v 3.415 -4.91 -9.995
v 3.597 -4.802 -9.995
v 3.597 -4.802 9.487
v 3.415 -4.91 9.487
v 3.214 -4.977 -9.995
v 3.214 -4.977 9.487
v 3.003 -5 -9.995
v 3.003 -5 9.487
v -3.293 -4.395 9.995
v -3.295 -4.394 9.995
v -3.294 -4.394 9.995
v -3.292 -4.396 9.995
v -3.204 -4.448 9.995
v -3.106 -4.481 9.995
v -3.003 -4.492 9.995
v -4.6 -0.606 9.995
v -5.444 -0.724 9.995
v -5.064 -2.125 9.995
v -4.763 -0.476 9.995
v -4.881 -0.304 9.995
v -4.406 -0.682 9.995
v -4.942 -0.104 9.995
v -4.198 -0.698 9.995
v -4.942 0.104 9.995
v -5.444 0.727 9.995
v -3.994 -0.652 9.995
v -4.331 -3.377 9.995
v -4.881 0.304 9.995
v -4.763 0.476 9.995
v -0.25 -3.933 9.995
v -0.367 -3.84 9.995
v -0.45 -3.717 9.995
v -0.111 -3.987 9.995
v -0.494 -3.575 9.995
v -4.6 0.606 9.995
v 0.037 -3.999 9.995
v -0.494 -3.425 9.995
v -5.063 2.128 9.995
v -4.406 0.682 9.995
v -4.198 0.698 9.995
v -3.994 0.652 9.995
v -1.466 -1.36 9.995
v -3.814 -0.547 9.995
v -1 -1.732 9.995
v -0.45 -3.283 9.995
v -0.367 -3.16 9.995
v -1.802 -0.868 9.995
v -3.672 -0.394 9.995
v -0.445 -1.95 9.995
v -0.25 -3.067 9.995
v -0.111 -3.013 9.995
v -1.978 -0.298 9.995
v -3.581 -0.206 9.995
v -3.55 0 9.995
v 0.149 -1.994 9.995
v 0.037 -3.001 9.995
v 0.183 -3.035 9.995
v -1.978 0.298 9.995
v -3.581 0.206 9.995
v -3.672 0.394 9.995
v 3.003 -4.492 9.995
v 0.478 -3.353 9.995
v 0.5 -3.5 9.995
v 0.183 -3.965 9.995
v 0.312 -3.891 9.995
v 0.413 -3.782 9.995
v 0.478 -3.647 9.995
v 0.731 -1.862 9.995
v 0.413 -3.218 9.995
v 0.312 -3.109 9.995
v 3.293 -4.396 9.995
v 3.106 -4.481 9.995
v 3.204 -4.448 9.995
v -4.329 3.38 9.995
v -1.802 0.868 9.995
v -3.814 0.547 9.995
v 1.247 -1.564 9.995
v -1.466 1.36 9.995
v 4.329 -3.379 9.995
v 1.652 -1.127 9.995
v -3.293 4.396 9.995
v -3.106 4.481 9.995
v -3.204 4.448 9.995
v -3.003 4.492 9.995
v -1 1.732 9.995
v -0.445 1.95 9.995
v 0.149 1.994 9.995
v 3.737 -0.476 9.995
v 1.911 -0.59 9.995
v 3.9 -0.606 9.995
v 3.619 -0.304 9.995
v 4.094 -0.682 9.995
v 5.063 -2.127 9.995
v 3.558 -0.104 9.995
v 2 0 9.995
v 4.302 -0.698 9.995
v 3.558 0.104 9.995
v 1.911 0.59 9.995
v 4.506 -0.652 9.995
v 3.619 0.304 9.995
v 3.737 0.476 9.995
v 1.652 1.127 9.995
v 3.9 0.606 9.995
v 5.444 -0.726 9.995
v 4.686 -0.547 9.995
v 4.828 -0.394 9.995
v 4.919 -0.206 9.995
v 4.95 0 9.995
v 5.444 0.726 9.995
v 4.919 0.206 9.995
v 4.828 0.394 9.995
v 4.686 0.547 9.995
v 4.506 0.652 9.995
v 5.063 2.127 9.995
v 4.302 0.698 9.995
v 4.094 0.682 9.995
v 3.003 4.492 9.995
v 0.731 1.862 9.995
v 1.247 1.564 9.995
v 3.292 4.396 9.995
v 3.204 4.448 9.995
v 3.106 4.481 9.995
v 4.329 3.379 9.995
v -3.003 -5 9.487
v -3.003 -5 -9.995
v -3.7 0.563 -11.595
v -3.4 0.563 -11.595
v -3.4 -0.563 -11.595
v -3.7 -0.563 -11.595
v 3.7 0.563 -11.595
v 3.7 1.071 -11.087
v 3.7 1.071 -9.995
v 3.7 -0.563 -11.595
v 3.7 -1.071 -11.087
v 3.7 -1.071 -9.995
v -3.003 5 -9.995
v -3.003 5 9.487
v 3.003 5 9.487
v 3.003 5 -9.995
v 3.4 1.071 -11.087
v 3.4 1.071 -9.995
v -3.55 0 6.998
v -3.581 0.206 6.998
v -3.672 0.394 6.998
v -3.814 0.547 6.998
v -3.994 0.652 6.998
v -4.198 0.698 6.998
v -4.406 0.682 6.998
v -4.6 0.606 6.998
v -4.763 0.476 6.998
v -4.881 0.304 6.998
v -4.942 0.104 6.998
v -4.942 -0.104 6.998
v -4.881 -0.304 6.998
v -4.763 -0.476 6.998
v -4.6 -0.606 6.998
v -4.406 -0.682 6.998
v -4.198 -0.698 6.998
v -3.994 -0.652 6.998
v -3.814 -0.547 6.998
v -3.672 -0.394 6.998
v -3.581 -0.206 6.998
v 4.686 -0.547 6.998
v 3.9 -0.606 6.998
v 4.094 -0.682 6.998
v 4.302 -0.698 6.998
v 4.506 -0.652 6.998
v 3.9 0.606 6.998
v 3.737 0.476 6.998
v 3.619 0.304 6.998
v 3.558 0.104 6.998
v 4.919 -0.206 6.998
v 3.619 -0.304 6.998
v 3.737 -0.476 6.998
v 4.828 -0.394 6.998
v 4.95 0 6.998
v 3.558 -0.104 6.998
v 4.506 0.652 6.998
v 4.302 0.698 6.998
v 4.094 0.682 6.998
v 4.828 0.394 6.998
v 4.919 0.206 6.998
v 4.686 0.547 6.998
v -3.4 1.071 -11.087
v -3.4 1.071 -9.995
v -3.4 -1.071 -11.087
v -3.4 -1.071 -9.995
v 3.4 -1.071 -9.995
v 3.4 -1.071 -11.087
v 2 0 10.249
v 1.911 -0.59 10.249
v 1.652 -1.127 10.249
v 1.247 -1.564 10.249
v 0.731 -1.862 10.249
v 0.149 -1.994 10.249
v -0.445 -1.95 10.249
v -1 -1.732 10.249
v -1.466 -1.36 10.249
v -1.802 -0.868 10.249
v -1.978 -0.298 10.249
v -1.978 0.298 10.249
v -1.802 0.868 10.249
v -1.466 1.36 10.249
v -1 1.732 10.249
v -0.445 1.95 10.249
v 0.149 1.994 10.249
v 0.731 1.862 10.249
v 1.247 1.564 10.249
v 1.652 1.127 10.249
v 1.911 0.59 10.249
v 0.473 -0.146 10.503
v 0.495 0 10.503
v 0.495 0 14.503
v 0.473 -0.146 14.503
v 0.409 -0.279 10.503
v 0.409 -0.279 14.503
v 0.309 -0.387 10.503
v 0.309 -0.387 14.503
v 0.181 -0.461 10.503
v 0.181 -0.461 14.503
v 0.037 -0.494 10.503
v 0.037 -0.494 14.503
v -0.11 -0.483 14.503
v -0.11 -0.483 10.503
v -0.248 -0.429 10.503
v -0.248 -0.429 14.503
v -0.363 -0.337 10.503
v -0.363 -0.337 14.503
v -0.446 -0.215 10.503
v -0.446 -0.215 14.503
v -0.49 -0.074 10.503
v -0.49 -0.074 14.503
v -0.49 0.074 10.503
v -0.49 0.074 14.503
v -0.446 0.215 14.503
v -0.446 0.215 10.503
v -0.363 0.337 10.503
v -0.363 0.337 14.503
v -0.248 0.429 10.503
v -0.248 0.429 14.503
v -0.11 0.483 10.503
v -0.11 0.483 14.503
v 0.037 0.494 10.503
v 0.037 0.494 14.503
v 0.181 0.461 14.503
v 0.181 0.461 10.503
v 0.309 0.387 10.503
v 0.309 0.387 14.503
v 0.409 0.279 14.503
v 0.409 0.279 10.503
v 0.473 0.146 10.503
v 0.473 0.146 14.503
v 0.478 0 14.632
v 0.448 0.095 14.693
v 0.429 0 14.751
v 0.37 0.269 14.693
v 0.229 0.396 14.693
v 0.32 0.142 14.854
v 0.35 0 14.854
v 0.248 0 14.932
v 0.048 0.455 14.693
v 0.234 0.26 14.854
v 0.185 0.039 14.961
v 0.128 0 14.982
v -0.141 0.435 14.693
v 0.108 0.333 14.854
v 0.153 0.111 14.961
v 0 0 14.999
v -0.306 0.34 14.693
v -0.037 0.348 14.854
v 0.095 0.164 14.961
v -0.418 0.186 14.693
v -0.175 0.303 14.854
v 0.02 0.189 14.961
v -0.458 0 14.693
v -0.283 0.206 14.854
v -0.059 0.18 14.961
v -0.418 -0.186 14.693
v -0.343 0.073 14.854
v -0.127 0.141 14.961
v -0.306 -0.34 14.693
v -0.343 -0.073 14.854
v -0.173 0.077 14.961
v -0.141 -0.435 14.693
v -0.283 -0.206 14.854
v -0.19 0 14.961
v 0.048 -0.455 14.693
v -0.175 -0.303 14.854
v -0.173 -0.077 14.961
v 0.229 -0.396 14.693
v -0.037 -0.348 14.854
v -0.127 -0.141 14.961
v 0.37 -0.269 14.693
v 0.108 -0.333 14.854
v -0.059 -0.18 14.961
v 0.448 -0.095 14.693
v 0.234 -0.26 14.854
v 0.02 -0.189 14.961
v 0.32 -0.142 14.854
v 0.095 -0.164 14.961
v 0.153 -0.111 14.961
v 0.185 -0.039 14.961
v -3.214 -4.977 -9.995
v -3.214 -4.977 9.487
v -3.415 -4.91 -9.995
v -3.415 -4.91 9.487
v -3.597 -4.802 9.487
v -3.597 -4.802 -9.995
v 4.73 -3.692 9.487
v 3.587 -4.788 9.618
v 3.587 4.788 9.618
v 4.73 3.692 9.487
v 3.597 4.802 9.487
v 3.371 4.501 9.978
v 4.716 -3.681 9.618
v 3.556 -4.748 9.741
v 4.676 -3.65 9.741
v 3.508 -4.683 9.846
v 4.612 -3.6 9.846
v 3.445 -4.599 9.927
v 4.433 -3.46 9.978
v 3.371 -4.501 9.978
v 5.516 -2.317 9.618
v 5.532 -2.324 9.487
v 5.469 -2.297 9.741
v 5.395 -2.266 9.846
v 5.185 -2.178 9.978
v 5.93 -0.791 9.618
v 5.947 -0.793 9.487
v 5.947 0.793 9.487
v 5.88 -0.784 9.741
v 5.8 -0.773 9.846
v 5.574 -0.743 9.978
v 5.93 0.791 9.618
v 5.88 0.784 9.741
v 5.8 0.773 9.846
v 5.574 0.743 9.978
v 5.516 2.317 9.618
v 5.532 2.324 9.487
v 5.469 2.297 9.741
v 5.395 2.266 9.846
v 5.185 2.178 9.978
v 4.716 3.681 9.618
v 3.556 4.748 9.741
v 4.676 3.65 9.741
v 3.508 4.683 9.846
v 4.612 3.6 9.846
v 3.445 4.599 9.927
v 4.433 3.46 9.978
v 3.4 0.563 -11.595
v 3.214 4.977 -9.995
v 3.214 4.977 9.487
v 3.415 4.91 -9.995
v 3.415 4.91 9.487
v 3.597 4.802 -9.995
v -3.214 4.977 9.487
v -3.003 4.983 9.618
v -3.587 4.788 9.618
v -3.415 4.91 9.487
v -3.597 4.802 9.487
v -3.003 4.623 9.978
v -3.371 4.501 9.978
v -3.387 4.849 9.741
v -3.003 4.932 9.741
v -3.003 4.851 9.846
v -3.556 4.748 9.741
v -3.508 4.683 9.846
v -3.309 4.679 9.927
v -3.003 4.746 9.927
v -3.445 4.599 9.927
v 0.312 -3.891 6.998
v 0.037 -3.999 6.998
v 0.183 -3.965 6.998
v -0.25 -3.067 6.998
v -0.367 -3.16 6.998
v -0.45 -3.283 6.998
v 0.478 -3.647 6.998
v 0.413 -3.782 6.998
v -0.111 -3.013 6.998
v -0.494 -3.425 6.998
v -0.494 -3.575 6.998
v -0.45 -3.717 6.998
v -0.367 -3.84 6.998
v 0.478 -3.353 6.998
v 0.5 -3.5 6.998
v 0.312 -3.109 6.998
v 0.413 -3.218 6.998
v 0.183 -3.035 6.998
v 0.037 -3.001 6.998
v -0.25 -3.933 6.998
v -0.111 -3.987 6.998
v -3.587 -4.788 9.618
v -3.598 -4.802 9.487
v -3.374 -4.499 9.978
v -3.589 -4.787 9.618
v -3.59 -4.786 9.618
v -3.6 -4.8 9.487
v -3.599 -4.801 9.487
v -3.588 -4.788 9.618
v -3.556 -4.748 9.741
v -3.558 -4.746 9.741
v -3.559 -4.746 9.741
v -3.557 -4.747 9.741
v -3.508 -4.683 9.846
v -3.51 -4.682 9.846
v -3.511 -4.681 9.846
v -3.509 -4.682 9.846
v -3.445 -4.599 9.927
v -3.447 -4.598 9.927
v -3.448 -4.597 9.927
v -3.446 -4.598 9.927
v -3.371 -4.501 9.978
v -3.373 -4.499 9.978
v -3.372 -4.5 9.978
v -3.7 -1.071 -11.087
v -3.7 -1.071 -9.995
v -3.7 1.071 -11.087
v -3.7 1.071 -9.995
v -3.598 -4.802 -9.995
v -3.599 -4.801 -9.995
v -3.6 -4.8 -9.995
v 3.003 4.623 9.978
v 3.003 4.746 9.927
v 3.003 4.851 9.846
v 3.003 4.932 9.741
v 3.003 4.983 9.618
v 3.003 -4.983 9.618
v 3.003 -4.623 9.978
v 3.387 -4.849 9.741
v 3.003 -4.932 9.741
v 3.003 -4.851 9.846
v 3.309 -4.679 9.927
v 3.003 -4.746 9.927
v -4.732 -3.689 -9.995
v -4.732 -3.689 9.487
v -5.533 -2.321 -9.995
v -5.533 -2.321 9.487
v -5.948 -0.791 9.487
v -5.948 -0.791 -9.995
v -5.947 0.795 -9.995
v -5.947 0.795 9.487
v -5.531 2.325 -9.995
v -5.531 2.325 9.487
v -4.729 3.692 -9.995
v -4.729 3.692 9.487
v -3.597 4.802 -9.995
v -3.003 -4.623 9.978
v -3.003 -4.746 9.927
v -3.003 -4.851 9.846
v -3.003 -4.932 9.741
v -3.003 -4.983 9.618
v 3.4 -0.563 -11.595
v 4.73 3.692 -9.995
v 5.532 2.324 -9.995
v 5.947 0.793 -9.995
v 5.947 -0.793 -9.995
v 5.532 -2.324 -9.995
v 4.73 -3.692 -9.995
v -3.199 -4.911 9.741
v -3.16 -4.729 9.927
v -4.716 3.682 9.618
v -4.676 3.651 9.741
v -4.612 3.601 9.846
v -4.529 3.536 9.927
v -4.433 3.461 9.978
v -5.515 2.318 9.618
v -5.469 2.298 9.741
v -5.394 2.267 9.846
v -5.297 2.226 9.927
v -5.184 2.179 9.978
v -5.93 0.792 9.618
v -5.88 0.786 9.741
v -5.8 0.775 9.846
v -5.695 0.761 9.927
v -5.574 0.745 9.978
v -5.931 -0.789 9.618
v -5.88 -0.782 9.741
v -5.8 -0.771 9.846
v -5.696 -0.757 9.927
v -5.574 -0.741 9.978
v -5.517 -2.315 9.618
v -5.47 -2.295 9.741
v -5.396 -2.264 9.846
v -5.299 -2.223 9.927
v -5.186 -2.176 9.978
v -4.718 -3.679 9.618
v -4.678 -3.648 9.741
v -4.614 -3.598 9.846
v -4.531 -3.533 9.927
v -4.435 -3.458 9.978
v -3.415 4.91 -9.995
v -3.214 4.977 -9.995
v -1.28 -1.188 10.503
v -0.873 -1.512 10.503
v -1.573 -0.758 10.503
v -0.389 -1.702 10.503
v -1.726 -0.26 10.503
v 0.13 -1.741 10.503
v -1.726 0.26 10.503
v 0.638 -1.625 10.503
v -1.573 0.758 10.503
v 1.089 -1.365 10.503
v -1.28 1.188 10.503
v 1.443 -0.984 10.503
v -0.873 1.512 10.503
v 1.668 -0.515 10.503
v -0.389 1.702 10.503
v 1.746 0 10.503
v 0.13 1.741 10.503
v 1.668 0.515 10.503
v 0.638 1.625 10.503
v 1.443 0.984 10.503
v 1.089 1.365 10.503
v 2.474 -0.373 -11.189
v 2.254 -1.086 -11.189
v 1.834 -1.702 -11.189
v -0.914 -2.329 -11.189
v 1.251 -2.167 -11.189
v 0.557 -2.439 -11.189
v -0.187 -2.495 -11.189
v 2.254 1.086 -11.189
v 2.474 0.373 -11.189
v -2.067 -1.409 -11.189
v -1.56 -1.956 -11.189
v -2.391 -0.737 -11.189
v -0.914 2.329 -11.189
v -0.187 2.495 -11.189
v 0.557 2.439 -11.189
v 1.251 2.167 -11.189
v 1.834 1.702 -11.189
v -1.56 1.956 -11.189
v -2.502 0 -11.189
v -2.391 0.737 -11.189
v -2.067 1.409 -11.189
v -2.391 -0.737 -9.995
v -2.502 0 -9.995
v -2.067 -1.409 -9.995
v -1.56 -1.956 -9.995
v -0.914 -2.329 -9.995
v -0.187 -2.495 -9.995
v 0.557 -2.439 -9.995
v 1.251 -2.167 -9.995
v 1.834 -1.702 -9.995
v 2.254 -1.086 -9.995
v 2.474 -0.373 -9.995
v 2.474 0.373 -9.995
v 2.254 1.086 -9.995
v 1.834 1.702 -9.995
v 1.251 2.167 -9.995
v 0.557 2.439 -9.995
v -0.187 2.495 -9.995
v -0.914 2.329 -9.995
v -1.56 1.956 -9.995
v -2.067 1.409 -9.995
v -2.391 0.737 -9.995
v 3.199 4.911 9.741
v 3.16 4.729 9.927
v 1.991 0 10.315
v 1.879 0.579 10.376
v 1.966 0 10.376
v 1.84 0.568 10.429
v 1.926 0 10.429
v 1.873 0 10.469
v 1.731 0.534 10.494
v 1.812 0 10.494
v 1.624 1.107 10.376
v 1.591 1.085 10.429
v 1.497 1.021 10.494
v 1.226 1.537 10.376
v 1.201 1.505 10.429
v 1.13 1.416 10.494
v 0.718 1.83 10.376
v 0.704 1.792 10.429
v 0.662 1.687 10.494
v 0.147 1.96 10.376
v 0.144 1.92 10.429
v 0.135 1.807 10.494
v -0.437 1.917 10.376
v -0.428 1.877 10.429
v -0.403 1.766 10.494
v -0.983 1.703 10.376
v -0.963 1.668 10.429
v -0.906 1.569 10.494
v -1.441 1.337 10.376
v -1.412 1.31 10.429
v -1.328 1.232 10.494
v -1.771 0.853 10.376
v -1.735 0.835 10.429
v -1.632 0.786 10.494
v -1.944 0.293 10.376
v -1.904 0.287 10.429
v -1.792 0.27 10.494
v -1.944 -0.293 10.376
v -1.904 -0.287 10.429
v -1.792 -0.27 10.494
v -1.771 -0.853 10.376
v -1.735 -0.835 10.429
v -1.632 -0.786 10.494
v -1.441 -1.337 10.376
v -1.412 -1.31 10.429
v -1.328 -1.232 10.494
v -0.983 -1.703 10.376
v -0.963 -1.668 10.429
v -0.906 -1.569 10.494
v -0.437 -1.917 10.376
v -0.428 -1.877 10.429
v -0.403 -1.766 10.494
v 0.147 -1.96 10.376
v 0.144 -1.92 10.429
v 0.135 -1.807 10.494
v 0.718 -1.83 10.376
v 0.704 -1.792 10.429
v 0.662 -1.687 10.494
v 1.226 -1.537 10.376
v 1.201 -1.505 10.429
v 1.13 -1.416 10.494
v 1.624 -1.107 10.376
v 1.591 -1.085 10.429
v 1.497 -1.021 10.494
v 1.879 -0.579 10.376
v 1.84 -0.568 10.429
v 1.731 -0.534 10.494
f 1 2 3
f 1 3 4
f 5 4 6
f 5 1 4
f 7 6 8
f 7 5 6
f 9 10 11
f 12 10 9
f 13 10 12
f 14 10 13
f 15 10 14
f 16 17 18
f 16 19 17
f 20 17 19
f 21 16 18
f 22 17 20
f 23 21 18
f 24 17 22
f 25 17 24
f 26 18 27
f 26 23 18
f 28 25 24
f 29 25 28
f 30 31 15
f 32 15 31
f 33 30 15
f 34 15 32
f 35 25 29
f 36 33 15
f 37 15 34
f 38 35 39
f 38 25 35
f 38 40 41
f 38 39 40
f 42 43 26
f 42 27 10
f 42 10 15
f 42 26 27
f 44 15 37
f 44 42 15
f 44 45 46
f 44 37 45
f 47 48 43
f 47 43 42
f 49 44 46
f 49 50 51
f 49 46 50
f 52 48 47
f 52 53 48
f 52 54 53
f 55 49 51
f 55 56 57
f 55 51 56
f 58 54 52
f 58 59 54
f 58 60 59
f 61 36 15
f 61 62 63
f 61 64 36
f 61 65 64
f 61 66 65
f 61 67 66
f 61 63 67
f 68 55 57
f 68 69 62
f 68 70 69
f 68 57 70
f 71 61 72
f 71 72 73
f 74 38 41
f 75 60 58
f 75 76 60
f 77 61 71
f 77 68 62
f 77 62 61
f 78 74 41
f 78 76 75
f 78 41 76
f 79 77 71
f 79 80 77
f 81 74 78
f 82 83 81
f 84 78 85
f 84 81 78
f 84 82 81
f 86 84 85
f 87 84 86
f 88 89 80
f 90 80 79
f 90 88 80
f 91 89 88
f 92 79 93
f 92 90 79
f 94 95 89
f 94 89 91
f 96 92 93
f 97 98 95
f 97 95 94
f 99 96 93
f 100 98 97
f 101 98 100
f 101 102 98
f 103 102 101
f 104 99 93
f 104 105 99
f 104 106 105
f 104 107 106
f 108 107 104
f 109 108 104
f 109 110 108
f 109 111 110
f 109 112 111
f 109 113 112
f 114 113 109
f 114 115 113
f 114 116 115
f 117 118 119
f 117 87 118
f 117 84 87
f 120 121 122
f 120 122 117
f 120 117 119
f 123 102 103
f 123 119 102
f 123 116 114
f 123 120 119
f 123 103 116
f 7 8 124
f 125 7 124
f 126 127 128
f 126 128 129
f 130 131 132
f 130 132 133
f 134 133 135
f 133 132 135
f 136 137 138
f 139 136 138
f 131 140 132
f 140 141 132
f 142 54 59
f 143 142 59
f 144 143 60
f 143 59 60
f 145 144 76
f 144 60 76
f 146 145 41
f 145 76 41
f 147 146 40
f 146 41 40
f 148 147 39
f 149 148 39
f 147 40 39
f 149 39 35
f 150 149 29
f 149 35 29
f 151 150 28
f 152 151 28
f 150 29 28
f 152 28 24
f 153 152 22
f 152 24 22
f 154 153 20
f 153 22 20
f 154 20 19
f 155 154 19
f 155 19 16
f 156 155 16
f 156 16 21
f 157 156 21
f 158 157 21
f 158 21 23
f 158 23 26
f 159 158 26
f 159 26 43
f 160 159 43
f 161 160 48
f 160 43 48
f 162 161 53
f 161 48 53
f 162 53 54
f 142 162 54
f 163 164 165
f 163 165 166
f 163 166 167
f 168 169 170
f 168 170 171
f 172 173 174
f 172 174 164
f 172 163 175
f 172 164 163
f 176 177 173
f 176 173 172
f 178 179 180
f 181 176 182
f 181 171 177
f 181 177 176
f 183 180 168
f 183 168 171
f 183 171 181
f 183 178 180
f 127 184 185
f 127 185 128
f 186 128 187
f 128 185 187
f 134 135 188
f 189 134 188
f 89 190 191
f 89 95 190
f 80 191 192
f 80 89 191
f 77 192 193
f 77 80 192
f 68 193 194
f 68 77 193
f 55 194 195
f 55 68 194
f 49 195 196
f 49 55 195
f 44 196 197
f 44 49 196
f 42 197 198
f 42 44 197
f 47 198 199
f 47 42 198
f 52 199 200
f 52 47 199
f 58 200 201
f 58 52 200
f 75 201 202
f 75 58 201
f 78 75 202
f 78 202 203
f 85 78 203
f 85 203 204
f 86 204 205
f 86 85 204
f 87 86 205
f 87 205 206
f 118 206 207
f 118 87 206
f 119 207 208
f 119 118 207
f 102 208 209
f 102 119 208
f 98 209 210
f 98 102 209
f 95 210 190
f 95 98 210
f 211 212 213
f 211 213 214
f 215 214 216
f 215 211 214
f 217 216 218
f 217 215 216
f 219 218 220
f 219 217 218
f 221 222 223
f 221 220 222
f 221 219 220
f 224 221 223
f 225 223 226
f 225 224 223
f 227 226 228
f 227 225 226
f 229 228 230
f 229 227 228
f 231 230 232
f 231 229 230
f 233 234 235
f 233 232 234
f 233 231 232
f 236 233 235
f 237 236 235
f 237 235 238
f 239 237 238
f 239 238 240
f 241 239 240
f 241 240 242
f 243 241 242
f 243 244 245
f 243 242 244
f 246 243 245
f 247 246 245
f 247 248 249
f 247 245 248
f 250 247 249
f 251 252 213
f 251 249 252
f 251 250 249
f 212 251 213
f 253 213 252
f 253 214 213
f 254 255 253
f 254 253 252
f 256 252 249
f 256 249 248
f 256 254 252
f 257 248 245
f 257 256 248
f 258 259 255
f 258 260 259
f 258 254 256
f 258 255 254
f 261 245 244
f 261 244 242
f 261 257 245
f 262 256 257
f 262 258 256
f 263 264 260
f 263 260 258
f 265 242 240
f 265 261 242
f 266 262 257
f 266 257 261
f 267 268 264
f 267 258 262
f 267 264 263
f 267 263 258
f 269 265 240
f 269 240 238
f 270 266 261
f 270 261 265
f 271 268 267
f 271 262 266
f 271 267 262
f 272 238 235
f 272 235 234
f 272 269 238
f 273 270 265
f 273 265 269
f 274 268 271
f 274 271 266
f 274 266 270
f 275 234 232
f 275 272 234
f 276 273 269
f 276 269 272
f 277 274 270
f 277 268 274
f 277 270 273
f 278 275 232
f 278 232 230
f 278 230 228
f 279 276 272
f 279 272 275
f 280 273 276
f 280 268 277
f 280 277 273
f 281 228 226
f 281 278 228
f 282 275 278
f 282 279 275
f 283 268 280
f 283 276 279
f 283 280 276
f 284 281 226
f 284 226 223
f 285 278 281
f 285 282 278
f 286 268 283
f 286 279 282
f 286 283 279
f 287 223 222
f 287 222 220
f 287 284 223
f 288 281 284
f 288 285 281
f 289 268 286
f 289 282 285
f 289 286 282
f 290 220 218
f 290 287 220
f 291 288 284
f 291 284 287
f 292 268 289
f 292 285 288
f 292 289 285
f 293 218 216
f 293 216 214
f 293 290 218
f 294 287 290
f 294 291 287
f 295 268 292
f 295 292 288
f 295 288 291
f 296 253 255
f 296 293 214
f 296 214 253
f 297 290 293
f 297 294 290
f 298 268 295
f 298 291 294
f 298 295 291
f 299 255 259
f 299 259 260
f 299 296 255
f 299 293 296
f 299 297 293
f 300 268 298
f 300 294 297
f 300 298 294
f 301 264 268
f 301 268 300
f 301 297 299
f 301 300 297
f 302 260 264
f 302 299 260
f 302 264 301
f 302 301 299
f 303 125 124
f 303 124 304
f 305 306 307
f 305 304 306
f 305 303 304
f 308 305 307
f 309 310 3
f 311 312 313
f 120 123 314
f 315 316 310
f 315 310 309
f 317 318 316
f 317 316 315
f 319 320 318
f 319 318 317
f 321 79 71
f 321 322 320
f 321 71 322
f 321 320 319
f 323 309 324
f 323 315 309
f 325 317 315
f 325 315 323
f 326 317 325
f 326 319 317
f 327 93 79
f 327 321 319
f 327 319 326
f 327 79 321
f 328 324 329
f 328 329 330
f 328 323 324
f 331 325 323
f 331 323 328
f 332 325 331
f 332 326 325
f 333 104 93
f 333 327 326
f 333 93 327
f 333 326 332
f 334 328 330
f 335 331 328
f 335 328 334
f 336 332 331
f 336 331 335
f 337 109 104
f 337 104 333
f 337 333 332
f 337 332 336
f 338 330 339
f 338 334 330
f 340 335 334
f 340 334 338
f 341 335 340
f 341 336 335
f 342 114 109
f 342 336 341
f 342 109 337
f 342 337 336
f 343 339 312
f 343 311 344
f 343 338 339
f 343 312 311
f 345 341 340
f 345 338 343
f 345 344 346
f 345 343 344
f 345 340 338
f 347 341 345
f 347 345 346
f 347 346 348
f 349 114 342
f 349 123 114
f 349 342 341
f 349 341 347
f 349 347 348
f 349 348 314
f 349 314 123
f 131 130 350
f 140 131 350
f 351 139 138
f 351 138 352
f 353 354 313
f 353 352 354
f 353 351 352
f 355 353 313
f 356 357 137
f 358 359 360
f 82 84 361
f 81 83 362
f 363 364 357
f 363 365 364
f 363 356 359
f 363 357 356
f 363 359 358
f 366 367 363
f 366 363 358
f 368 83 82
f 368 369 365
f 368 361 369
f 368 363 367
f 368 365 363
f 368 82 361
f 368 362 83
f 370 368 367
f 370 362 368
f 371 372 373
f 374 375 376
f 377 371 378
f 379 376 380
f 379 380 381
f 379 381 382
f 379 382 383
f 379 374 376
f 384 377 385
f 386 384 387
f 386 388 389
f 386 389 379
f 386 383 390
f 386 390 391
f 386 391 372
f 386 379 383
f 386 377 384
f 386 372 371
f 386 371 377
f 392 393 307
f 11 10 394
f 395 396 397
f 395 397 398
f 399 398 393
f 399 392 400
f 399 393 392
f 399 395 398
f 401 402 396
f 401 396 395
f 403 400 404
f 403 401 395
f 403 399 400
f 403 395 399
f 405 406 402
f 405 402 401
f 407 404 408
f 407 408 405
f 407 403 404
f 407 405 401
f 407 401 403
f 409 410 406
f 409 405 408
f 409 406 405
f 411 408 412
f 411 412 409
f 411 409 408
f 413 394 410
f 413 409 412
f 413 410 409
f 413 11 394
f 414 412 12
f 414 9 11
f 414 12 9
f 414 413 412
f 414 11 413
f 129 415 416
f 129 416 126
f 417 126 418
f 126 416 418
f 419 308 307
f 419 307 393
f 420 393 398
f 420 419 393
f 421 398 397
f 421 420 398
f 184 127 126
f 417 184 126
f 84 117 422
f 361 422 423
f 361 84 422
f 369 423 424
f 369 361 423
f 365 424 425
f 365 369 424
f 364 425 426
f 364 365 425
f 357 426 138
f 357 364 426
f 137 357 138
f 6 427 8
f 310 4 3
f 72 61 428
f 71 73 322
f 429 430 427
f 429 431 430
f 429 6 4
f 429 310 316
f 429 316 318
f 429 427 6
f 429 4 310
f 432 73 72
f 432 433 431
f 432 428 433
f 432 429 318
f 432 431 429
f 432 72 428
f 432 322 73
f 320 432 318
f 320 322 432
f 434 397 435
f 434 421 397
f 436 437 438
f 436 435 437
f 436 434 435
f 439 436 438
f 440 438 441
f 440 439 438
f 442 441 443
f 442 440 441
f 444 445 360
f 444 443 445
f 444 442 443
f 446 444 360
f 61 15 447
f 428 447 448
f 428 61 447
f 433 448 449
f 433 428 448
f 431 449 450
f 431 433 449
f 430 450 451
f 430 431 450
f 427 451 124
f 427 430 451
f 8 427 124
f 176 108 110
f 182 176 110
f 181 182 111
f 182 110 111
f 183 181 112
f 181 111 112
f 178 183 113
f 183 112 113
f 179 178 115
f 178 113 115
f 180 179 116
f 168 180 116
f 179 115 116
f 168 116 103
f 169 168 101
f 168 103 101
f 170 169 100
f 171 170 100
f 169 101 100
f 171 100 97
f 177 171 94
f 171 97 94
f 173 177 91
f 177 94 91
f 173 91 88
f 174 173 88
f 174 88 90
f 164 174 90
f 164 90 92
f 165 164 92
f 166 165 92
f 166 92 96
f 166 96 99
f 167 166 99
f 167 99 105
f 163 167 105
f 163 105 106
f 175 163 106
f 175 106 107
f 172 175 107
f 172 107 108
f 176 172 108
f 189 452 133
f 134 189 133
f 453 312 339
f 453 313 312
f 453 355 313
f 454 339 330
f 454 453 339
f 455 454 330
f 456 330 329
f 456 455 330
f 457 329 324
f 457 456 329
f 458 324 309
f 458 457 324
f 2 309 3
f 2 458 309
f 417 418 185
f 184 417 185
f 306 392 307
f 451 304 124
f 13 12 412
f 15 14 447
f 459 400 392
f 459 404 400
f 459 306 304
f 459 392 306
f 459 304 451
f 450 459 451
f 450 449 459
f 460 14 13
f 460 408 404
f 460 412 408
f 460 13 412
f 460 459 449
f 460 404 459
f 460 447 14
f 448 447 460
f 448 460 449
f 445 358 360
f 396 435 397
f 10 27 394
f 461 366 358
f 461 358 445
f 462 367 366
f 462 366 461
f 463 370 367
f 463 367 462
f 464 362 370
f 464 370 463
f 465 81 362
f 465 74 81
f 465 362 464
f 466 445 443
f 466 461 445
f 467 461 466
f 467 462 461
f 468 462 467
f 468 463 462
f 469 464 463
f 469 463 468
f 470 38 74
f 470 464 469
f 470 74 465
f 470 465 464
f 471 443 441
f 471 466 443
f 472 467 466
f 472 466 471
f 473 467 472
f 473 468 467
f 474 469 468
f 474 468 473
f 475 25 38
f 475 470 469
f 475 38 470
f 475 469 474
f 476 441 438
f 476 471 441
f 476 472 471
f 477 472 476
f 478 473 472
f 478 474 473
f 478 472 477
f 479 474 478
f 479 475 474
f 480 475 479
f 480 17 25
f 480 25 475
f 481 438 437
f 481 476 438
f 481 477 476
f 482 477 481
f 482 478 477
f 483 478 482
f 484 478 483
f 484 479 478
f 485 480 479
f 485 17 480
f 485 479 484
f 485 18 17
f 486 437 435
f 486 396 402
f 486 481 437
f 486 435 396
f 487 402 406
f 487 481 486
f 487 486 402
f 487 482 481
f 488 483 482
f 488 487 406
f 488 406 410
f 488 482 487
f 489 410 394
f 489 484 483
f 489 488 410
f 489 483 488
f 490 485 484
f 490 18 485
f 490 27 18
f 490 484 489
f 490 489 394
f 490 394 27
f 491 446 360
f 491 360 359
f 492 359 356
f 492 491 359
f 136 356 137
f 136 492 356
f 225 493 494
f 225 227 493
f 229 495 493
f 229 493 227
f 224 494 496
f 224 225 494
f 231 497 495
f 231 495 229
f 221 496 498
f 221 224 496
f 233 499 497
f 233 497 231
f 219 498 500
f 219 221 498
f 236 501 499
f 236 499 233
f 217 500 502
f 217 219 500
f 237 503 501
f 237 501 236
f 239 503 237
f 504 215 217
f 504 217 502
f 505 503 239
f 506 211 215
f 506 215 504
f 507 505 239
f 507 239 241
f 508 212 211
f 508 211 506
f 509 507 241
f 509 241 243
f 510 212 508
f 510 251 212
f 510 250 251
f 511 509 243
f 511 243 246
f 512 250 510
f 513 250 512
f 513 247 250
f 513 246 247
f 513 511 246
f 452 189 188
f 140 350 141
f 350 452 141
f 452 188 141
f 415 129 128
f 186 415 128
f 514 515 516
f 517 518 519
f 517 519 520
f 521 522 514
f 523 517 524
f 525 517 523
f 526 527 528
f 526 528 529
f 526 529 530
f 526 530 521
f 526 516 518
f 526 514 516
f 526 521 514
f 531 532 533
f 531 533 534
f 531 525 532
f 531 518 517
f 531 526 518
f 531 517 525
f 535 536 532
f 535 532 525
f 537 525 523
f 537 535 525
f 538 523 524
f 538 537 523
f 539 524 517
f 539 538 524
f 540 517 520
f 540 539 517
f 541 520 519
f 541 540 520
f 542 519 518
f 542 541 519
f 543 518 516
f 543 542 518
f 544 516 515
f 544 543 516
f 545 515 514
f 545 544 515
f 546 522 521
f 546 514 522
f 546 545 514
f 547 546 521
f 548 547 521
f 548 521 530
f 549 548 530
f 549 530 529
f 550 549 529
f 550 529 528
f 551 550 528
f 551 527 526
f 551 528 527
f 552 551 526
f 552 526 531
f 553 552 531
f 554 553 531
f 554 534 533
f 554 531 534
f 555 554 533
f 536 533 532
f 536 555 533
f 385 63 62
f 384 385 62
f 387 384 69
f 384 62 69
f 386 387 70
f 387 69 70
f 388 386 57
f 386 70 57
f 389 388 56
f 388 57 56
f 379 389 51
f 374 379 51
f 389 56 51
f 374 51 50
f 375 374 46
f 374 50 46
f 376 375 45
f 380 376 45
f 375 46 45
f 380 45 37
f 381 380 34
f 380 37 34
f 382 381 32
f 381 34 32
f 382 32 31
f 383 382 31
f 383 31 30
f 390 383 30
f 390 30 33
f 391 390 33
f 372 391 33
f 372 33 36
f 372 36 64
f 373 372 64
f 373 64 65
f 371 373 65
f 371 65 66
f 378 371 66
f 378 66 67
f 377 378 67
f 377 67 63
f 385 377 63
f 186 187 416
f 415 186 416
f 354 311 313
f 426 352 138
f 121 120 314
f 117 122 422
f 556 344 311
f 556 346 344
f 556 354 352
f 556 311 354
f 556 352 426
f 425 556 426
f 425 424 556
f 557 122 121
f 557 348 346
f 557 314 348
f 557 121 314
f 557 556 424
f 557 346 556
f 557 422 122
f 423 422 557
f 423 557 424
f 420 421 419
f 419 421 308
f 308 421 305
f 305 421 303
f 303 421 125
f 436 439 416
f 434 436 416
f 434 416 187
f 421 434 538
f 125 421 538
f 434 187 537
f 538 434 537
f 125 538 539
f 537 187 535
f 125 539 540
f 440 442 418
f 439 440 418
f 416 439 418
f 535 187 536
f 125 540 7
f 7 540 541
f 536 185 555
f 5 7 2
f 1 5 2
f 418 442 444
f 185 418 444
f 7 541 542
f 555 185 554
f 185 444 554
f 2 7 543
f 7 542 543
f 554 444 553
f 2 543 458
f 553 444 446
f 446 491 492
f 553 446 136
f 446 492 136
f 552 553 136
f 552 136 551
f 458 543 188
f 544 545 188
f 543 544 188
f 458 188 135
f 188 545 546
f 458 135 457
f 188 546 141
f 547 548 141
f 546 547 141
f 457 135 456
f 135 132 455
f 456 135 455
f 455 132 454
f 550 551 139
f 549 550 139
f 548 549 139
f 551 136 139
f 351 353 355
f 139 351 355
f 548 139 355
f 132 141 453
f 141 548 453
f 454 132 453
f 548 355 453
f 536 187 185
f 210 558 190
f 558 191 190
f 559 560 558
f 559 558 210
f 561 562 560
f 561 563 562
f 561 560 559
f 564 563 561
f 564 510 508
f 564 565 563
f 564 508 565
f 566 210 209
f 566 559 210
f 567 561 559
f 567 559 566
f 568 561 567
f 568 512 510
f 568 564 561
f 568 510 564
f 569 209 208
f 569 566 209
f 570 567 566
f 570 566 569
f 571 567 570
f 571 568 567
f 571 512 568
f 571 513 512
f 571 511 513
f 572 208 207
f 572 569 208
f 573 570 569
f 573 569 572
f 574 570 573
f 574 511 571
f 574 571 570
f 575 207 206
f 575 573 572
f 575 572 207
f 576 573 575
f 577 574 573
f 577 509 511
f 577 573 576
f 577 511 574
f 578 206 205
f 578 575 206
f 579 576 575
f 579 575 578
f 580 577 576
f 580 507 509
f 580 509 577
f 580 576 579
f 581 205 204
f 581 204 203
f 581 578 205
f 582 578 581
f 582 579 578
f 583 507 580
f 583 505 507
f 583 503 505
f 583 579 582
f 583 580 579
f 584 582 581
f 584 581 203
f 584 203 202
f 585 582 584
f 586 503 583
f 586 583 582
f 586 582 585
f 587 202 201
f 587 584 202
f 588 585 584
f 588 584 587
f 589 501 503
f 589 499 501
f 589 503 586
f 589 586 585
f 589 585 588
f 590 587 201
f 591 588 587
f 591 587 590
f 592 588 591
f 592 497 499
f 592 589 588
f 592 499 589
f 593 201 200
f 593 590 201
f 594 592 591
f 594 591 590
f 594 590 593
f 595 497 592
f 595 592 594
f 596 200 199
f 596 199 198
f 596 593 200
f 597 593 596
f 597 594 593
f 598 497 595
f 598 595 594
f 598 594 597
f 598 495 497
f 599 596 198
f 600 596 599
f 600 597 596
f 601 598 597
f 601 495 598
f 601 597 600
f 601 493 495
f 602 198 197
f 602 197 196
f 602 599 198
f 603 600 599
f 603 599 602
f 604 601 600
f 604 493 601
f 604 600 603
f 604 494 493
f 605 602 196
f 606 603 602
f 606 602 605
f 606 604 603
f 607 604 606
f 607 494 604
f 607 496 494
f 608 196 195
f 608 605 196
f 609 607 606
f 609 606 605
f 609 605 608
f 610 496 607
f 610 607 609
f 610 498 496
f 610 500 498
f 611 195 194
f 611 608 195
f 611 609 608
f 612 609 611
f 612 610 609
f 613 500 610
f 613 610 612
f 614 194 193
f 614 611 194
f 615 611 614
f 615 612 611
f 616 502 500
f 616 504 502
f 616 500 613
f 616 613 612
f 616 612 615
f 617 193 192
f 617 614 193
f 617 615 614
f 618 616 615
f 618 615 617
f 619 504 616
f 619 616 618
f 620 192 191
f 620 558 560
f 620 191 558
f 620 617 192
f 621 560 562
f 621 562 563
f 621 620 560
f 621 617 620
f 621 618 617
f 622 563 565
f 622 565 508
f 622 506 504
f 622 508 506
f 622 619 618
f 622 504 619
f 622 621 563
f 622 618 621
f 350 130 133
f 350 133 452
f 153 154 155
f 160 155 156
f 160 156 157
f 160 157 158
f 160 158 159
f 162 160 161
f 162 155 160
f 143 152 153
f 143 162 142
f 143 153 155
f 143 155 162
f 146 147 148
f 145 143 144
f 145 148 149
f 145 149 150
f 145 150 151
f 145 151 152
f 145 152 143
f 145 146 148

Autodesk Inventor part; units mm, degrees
ref_plane "YZ Plane" through (0, 0, 0) normal (1, 0, 0) x (0, 1, 0)
ref_plane "XZ Plane" through (0, 0, 0) normal (0, 1, 0) x (-1, 0, 0)
ref_plane "XY Plane" through (0, 0, 0) normal (0, 0, 1) x (1, 0, 0)
sketch "Sketch1" plane through (0, 0, 0) normal (0, 0, 1) x (1, 0, 0)
  line L0 (-3.0031, 5) -> (3.0031, 5)
  arc A0 (-3.597, 4.8023) -> (-3.6, -4.8) centre (0, 0) ccw
  line L1 (3.0031, -5) -> (-3.0031, -5)
  arc A1 (-3.597, 4.8023) -> (-3.597, -4.8023) centre (0, 0) ccw
  arc A2 (3.597, -4.8023) -> (3.597, 4.8023) centre (0, 0) ccw
  arc A3 (-3.0031, 5) -> (-3.597, 4.8023) centre (-3.0031, 4.0094) ccw
  arc A4 (3.597, 4.8023) -> (3.0031, 5) centre (3.0031, 4.0094) ccw
  arc A5 (3.0031, -5) -> (3.597, -4.8023) centre (3.0031, -4.0094) ccw
  arc A6 (-3.597, -4.8023) -> (-3.0031, -5) centre (-3.0031, -4.0094) ccw
  point P0 (0, 0)
  point P1 (3.3166, 5)
  point P2 (3.3166, -5)
  point P3 (-3.3166, -5)
  dimension "d0" = 0.9906
extrude "Extrusion1" add sketch "Sketch1" along normal mid plane 19.9898
fillet "Fillet1" radius 0.508 8 edges at (-3.3161, 4.9493, 9.9949) (-6, 0, 9.9949) (-3.3161, -4.9493, 9.9949) (0, -5, 9.9949) (3.3161, -4.9493, 9.9949) (6, 0, 9.9949) (3.3161, 4.9493, 9.9949) (0, 5, 9.9949)
sketch "Sketch2" plane through (0, 0, 9.9949) normal (0, 0, 1) x (1, 0, 0)
  arc A0 (-3, 4.5) -> (-3.3, 4.4) centre (-2.9981, 3.9944) ccw
  spline S0 degree 3 poles (-3.3, 4.4) (-3.4685, 4.2736) (-3.6287, 4.1385) (-3.7806, 3.9947) (-3.8945, 3.8869) (-4.0038, 3.7742) (-4.1084, 3.6566) (-4.1433, 3.6174) (-4.1767, 3.5788) (-4.2115, 3.5374) (-4.4897, 3.2063) (-4.726, 2.8465) (-4.9194, 2.4597) (-5.0886, 2.1212) (-5.2214, 1.7694) (-5.3178, 1.4041) (-5.3315, 1.3519) (-5.3449, 1.298) (-5.3568, 1.2467) (-5.4522, 0.837) (-5.5, 0.4207) (-5.5, 0) (-5.5, -0.3681) (-5.4635, -0.7323) (-5.3904, -1.0926) (-5.38, -1.144) (-5.3691, -1.1941) (-5.3568, -1.2467) (-5.2588, -1.6679) (-5.1127, -2.0729) (-4.9194, -2.4597) (-4.7502, -2.7981) (-4.5484, -3.1155) (-4.3139, -3.4117) (-4.2805, -3.4541) (-4.2453, -3.4972) (-4.2115, -3.5374) (-3.941, -3.8595) (-3.6373, -4.147) (-3.3, -4.4) knots 0 0 0 0 0.0625 0.0625 0.0625 0.109375 0.109375 0.109375 0.125 0.125 0.125 0.25 0.25 0.25 0.359375 0.359375 0.359375 0.375 0.375 0.375 0.5 0.5 0.5 0.609375 0.609375 0.609375 0.625 0.625 0.625 0.75 0.75 0.75 0.859375 0.859375 0.859375 0.875 0.875 0.875 1 1 1 1
  arc A1 (-3.3, -4.4) -> (-3, -4.5) centre (-2.9981, -3.9944) ccw
  line L0 (-3, -4.5) -> (3, -4.5)
  arc A2 (3, -4.5) -> (3.3, -4.4) centre (2.9981, -3.9944) ccw
  arc A3 (3.3, -4.4) -> (3.3, 4.4) centre (0, 0) ccw
  arc A4 (3.3, 4.4) -> (3, 4.5) centre (2.9981, 3.9944) ccw
  line L1 (3, 4.5) -> (-3, 4.5)
  circle A5 centre (-4.25, 0) radius 0.7
  circle A6 centre (4.25, 0) radius 0.7
  circle A7 centre (0, 0) radius 2
  circle A8 centre (0, -3.5) radius 0.5
  circle A9 centre (0, -3.5) radius 0.5
  circle A10 centre (-4.25, 0) radius 0.7
  circle A11 centre (4.25, 0) radius 0.7
  circle A12 centre (0, 0) radius 2
  line L2 (3, 4.5) -> (-3, 4.5)
  arc A13 (-3, 4.5) -> (-3.3, 4.4) centre (-2.9981, 3.9944) ccw
  spline S1 degree 3 poles (-3.3, 4.4) (-3.4685, 4.2736) (-3.6287, 4.1385) (-3.7806, 3.9947) (-3.8945, 3.8869) (-4.0038, 3.7742) (-4.1084, 3.6566) (-4.1433, 3.6174) (-4.1767, 3.5788) (-4.2115, 3.5374) (-4.4897, 3.2063) (-4.726, 2.8465) (-4.9194, 2.4597) (-5.0886, 2.1212) (-5.2214, 1.7694) (-5.3178, 1.4041) (-5.3315, 1.3519) (-5.3449, 1.298) (-5.3568, 1.2467) (-5.4522, 0.837) (-5.5, 0.4207) (-5.5, 0) (-5.5, -0.3681) (-5.4635, -0.7323) (-5.3904, -1.0926) (-5.38, -1.144) (-5.3691, -1.1941) (-5.3568, -1.2467) (-5.2588, -1.6679) (-5.1127, -2.0729) (-4.9194, -2.4597) (-4.7502, -2.7981) (-4.5484, -3.1155) (-4.3139, -3.4117) (-4.2805, -3.4541) (-4.2453, -3.4972) (-4.2115, -3.5374) (-3.941, -3.8595) (-3.6373, -4.147) (-3.3, -4.4) knots 0 0 0 0 0.0625 0.0625 0.0625 0.109375 0.109375 0.109375 0.125 0.125 0.125 0.25 0.25 0.25 0.359375 0.359375 0.359375 0.375 0.375 0.375 0.5 0.5 0.5 0.609375 0.609375 0.609375 0.625 0.625 0.625 0.75 0.75 0.75 0.859375 0.859375 0.859375 0.875 0.875 0.875 1 1 1 1
  arc A14 (-3.3, -4.4) -> (-3, -4.5) centre (-2.9981, -3.9944) ccw
  line L3 (-3, -4.5) -> (3, -4.5)
  arc A15 (3, -4.5) -> (3.3, -4.4) centre (2.9981, -3.9944) ccw
  arc A16 (3.3, -4.4) -> (3.3, 4.4) centre (0, 0) ccw
  arc A17 (3.3, 4.4) -> (3, 4.5) centre (2.9981, 3.9944) ccw
  line L4 (-3, 5) -> (3, 5)
  arc A18 (3.6, -4.8) -> (3.6, 4.8) centre (0, 0) ccw
  arc A19 (-3.6, 4.8) -> (-3.6, -4.8) centre (0, 0) ccw
  line L5 (3, -5) -> (-3, -5)
  arc A20 (-3, 5) -> (-3.6, 4.8) centre (-3, 4) ccw
extrude "Extrusion2" add sketch "Sketch2" along normal blind 0.508 contours A7
fillet "Fillet2" radius 0.254 1 edges at (-2, 0, 10.5029)
extrude "Extrusion3" cut sketch "Sketch2" against normal blind 2.9972 contours A5 | A6 | A8
sketch "Sketch3" plane through (0, 0, 10.5029) normal (0, 0, 1) x (1, 0, 0)
  circle A0 centre (0, 0) radius 1.746 projected
  circle A1 centre (0, 0) radius 0.4953
  dimension "d9" = 0.9906
extrude "Extrusion4" add sketch "Sketch3" along normal blind 4.4958 contours A1
fillet "Fillet3" radius 0.4953 1 edges at (-0.4953, 0, 14.9987)
sketch "Sketch4" plane through (0, 0, -9.9949) normal (0, 0, -1) x (-1, 0, 0)
  arc A0 (-3.597, 4.8023) -> (-3.597, -4.8023) centre (0, 0) ccw projected
  circle A1 centre (0, 0) radius 2.5019
  dimension "d13" = 5.0038
extrude "Extrusion5" add sketch "Sketch4" along normal blind 1.1938
sketch "Sketch5" plane through (0, 0, -9.9949) normal (0, 0, -1) x (-1, 0, 0)
  arc A0 (-3, 5) -> (-3.6, 4.8) centre (-3, 4) ccw
  arc A1 (-3.6, 4.8) -> (-3.6, -4.8) centre (0, 0) ccw
  arc A2 (-3.6, -4.8) -> (-3, -5) centre (-3, -4) ccw
  line L0 (3, -5) -> (-3, -5)
  arc A3 (3, -5) -> (3.6, -4.8) centre (3, -4) ccw
  arc A4 (3.6, -4.8) -> (3.6, 4.8) centre (0, 0) ccw
  arc A5 (3.6, 4.8) -> (3, 5) centre (3, 4) ccw
  line L1 (-3, 5) -> (3, 5)
  line L2 (3.7, -1.0714) -> (3.7, 1.0714)
  line L3 (3.4, -1.0714) -> (3.7, -1.0714)
  line L4 (3.4, 1.0714) -> (3.4, -1.0714)
  line L5 (3.7, 1.0714) -> (3.4, 1.0714)
  circle A6 centre (0, 0) radius 2.5
  line L6 (-3.7, -1.0714) -> (-3.4, -1.0714)
  line L7 (-3.7, 1.0714) -> (-3.7, -1.0714)
  line L8 (-3.4, 1.0714) -> (-3.7, 1.0714)
  line L9 (-3.4, -1.0714) -> (-3.4, 1.0714)
extrude "Extrusion6" add sketch "Sketch5" along normal blind 1.6002 contours L3 L4 L5 L2 | L7 L8 L9 L6
chamfer "Chamfer1" distance 0.508 angle 45 4 edges at (3.55, 1.0714, -11.5951) (3.55, -1.0714, -11.5951) (-3.55, 1.0714, -11.5951) (-3.55, -1.0714, -11.5951)
properties part number "QFK-N30QAV-16068"
